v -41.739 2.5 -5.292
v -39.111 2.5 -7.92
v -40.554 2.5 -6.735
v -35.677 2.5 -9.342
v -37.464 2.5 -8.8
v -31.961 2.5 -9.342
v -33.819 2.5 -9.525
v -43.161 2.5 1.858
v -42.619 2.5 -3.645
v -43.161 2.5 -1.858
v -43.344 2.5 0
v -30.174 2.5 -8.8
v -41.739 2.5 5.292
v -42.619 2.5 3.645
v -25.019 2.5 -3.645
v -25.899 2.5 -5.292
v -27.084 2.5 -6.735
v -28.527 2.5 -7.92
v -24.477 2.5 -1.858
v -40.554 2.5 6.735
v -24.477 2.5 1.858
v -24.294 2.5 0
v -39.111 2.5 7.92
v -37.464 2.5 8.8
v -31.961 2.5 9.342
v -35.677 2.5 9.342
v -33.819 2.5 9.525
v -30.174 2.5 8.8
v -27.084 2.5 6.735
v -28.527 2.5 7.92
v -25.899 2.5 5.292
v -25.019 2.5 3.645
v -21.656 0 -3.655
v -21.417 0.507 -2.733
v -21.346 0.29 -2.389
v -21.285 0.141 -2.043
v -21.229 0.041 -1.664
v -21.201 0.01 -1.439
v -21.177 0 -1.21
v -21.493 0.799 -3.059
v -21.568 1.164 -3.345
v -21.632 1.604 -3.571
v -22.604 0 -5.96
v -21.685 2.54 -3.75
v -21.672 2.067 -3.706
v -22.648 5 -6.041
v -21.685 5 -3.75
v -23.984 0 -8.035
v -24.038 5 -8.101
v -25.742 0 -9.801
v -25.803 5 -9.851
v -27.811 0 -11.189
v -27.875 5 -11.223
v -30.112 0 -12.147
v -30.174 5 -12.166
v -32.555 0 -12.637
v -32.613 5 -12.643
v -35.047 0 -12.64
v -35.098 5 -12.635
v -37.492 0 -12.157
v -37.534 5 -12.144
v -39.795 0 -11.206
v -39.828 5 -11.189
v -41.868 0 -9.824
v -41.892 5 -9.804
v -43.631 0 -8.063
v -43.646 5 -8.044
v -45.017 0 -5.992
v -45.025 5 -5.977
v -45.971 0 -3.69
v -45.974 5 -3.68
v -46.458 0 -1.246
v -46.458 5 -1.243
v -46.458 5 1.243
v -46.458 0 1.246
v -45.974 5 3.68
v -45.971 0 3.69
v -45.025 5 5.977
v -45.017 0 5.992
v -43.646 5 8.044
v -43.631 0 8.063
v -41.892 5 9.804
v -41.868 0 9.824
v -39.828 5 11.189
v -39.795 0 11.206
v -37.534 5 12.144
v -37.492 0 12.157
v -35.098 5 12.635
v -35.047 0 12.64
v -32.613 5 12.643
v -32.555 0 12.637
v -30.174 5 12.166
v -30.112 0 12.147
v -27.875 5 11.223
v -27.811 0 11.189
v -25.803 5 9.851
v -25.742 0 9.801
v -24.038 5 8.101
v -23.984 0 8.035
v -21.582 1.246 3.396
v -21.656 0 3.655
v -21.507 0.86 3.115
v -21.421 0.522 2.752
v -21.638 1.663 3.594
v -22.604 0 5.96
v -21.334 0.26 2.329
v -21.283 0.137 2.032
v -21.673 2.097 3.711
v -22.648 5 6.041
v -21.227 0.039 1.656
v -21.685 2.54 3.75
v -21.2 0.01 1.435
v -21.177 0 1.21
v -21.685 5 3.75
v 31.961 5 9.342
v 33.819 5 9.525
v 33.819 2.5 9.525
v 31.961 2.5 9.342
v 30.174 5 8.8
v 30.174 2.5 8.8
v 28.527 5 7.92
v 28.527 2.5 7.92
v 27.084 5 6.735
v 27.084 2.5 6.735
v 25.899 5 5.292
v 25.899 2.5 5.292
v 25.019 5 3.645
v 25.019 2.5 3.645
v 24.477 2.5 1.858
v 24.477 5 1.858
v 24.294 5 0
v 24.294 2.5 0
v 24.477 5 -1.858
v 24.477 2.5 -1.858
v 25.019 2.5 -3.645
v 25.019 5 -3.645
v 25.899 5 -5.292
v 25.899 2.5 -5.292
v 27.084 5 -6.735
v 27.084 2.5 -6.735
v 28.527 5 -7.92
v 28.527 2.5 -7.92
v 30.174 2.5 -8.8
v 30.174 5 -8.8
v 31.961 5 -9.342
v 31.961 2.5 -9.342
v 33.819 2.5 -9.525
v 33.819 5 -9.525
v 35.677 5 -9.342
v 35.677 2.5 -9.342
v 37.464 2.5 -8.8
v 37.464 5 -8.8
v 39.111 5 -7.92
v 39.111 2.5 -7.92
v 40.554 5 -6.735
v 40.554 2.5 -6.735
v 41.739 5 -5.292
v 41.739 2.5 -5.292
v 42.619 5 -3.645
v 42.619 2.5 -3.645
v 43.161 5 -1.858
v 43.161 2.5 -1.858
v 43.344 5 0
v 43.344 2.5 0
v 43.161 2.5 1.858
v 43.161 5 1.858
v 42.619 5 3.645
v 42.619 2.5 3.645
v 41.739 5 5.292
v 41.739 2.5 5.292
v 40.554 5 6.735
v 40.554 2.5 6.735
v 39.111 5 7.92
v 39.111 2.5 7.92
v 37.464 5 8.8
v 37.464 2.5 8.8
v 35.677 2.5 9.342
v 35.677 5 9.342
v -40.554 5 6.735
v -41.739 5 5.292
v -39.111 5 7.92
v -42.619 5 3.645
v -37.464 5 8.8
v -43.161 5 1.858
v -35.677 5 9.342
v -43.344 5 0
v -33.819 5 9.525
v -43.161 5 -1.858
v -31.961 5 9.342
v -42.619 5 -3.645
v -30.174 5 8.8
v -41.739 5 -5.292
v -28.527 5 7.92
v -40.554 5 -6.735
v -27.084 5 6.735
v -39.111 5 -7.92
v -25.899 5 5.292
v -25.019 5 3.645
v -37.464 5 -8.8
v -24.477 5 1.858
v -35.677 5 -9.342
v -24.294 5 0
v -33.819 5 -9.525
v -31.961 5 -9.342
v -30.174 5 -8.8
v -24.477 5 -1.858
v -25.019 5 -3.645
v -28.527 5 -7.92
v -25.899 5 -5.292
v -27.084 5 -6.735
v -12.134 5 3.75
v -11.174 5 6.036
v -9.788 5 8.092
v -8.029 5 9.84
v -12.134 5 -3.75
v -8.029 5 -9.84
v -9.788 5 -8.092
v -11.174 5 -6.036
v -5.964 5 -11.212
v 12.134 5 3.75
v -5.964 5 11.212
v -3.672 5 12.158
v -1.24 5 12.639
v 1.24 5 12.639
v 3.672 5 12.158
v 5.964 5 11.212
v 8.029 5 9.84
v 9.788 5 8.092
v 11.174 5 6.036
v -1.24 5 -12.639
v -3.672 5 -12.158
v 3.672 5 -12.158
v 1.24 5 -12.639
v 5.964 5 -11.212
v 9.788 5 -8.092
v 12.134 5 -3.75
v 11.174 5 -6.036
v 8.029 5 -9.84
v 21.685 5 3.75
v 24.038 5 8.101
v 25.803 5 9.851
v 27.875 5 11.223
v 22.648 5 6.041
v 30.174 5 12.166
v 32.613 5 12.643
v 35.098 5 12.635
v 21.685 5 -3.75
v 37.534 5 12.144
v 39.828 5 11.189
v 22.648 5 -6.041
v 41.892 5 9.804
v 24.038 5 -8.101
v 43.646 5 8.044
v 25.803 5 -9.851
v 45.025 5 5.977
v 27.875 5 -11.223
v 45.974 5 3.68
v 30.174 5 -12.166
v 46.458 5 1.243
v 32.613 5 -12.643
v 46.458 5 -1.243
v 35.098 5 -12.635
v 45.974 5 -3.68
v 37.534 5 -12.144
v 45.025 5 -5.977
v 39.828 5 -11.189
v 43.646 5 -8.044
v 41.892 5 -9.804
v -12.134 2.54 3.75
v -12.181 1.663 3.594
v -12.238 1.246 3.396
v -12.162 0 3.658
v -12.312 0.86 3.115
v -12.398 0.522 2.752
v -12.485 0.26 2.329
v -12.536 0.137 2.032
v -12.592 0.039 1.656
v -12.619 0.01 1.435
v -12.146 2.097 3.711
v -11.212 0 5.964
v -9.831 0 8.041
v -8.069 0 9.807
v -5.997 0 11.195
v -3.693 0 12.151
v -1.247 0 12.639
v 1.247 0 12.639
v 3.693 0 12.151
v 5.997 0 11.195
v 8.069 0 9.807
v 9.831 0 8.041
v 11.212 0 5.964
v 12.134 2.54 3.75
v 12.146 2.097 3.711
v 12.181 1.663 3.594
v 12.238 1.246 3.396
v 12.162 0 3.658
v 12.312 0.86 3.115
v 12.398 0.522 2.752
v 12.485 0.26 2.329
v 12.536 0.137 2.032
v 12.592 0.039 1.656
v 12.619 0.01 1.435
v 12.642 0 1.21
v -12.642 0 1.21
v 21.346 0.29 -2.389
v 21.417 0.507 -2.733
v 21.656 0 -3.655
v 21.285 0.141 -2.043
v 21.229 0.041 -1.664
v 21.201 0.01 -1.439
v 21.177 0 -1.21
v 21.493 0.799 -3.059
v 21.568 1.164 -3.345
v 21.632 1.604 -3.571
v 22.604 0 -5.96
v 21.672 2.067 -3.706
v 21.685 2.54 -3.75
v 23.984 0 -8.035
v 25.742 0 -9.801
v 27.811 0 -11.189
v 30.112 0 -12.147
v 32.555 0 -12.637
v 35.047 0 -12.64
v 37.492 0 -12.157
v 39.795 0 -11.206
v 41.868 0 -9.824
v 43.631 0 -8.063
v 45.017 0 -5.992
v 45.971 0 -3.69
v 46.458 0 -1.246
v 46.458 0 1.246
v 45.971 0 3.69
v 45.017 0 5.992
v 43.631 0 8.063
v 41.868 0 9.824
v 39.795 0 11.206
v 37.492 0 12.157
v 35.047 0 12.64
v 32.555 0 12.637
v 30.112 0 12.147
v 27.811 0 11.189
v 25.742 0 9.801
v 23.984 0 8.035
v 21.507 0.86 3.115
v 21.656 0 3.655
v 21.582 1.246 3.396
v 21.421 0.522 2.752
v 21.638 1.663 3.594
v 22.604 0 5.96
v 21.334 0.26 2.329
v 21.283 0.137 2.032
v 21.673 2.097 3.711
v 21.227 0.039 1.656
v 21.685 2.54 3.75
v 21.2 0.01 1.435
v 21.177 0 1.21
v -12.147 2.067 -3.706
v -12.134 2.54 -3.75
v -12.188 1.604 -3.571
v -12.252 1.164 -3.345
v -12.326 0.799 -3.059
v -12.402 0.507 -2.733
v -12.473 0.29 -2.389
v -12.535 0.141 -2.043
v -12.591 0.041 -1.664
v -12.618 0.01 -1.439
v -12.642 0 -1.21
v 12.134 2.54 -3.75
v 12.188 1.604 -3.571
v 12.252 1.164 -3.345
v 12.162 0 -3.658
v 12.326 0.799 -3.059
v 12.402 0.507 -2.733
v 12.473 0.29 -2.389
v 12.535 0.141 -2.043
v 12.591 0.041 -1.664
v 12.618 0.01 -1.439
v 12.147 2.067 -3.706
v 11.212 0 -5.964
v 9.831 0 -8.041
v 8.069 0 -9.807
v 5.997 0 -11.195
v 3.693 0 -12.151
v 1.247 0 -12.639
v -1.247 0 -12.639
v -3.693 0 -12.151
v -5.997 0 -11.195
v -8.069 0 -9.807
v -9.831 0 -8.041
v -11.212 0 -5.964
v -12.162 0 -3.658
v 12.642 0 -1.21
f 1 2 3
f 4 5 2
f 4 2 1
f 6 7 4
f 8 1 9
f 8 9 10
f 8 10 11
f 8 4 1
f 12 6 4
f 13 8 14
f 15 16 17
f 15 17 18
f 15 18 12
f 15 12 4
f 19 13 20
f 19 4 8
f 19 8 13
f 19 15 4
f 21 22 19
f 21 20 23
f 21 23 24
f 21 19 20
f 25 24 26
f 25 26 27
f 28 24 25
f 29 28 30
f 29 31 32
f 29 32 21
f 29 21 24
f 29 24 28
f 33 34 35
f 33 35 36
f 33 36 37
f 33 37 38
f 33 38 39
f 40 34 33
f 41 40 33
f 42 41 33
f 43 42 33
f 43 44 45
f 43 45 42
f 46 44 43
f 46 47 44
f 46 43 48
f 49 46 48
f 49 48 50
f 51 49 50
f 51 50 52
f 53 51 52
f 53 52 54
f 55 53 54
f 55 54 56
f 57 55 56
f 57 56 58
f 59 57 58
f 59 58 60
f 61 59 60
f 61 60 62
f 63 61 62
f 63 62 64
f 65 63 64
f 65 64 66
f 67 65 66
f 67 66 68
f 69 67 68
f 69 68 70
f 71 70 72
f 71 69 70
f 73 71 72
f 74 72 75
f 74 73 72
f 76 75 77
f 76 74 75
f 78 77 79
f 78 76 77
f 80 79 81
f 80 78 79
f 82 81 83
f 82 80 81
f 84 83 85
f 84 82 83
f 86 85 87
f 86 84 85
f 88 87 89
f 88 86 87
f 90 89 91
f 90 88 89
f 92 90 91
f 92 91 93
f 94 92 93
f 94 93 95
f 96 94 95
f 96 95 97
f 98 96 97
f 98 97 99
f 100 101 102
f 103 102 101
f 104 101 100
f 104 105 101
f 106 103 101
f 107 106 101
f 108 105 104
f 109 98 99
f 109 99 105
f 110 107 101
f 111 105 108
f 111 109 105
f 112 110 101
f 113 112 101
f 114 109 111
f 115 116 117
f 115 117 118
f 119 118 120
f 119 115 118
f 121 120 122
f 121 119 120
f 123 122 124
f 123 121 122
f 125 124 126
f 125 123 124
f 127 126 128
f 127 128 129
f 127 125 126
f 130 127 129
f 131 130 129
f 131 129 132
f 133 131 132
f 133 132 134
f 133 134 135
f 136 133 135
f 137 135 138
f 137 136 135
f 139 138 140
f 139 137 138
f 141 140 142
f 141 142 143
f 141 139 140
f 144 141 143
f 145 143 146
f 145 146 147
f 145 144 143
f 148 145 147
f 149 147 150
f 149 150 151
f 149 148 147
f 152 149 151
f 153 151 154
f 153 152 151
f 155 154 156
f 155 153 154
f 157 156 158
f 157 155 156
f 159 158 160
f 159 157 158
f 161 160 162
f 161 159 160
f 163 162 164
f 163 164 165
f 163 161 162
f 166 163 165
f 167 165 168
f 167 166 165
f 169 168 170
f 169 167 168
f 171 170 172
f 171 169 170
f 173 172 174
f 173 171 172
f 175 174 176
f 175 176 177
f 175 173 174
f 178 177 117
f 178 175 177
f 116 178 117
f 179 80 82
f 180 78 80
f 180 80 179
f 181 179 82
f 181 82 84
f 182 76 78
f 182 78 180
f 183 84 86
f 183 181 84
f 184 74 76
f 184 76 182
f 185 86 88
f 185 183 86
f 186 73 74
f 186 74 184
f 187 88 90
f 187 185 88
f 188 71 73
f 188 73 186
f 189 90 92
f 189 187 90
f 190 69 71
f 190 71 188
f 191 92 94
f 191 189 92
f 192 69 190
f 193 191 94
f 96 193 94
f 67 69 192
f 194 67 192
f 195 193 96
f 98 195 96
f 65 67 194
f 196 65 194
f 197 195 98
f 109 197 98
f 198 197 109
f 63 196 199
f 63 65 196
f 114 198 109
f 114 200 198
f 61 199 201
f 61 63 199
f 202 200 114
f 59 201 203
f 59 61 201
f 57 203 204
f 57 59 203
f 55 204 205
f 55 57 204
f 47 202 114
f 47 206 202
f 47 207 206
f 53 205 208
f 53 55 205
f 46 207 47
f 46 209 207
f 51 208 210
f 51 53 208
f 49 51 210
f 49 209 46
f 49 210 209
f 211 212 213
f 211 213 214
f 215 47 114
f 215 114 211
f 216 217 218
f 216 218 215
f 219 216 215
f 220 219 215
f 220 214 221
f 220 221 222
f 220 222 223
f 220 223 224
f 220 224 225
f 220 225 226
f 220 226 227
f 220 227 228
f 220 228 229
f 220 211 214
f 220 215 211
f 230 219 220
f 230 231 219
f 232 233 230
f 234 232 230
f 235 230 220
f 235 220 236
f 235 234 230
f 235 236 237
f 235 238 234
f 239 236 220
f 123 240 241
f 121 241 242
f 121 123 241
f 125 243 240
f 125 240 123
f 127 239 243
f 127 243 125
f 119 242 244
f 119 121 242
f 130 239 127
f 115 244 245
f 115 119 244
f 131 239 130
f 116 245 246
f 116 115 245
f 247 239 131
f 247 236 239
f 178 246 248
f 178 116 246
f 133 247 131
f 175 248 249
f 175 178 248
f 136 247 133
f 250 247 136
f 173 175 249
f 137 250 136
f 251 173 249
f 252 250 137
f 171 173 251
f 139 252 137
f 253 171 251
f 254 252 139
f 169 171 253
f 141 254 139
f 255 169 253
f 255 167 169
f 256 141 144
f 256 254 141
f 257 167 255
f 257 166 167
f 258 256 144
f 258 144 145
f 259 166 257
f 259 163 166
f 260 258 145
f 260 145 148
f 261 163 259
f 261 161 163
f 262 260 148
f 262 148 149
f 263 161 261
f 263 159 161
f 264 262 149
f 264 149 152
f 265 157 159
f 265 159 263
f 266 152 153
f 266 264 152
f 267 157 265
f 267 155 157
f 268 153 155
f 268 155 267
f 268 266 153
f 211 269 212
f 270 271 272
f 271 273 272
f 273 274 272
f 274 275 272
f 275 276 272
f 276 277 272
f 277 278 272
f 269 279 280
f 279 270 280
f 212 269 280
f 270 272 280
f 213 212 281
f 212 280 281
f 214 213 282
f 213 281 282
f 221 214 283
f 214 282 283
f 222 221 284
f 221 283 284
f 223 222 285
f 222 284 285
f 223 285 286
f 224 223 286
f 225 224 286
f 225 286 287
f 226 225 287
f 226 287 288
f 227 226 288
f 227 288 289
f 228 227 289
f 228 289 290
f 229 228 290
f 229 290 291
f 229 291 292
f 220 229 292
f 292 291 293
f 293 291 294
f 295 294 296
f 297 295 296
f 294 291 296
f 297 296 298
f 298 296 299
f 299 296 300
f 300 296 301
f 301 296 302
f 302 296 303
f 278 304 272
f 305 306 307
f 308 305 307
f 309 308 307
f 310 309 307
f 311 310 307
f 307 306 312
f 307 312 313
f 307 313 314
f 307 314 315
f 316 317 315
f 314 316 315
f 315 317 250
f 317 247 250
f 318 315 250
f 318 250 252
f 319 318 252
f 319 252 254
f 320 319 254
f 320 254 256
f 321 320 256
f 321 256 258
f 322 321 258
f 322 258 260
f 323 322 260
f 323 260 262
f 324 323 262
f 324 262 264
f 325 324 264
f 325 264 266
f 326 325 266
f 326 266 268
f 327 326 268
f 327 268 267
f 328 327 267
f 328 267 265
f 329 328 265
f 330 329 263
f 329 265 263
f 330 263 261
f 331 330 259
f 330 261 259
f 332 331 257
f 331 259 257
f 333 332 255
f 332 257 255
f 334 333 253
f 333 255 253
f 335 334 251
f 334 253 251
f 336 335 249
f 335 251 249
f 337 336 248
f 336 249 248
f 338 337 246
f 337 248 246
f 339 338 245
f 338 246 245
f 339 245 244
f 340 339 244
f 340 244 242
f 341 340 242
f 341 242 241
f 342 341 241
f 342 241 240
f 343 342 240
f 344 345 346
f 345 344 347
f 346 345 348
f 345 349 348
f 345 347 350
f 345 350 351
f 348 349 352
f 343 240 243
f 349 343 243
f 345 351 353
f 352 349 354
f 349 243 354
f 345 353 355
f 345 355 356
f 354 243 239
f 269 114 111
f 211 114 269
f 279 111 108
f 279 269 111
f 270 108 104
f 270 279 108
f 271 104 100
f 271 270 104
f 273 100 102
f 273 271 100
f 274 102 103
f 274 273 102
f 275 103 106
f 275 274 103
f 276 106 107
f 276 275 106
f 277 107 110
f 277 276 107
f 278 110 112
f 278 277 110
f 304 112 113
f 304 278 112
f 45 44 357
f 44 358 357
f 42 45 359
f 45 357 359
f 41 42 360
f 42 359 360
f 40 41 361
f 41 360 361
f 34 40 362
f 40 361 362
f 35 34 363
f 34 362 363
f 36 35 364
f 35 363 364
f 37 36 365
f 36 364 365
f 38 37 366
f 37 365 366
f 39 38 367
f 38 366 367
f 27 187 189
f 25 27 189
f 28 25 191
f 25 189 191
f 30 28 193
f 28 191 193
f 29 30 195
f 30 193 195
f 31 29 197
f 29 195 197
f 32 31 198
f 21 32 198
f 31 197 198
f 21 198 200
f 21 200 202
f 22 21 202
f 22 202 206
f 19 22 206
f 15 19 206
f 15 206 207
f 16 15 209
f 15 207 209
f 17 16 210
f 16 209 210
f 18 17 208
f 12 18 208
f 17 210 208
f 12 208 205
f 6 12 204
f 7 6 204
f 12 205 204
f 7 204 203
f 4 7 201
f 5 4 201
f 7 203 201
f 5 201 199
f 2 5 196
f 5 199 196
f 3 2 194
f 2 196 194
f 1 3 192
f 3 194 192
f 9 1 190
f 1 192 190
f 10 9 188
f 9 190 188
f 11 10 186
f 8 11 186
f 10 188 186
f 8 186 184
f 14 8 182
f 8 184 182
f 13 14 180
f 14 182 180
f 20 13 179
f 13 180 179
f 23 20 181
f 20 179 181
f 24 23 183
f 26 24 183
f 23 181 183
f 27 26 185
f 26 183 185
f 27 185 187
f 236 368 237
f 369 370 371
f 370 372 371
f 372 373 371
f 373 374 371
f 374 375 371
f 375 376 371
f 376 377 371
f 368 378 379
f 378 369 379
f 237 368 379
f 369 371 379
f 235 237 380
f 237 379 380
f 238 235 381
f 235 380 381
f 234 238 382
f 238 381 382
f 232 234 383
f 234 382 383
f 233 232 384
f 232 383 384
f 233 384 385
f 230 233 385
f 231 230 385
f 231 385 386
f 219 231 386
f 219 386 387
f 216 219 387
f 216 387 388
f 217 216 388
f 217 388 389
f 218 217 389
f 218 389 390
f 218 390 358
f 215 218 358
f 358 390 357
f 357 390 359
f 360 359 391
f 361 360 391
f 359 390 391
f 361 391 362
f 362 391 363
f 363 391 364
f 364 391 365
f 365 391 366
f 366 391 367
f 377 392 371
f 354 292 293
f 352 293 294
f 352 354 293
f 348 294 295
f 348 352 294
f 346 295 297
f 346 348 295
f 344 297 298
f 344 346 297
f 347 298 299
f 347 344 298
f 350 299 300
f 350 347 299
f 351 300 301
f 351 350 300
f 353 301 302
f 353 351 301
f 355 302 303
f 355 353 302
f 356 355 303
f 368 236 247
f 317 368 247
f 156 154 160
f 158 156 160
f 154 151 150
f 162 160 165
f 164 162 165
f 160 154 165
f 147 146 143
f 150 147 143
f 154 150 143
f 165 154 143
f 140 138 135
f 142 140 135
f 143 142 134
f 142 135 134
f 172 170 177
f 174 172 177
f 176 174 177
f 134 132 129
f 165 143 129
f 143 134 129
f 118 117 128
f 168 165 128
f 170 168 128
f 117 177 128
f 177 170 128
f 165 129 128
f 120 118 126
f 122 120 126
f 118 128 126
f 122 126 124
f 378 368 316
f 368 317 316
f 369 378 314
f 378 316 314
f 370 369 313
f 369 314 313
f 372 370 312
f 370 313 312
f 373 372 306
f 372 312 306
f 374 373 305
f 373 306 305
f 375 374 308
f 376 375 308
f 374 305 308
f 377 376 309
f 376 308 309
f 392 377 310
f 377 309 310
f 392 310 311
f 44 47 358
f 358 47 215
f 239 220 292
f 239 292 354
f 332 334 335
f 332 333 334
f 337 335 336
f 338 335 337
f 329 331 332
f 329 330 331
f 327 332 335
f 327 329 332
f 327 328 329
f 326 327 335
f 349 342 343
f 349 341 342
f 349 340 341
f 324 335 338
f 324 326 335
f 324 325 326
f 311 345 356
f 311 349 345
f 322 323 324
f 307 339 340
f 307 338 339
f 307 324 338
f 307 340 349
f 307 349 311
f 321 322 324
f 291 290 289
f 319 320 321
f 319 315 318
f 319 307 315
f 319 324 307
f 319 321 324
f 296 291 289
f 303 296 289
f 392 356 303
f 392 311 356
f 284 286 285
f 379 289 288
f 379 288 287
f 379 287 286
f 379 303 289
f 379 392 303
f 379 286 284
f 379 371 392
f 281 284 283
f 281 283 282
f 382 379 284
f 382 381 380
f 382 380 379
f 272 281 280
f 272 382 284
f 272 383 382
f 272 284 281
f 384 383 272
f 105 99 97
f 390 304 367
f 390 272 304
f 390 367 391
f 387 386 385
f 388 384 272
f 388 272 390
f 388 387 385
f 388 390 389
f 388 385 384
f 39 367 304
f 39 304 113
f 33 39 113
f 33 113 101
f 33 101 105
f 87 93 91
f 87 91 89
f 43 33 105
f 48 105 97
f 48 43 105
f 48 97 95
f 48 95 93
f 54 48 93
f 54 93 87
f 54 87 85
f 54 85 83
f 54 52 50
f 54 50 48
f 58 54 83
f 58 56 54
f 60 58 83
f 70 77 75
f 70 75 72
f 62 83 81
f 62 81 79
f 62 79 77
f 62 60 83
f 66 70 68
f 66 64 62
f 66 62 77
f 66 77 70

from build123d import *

# Parameters (mm, degrees)
SKETCH1_R           = 12.7
BOSS_EXTRUDE1_DEPTH = 5
SKETCH2_W           = 76.2
SKETCH2_H           = 7.5
BOSS_EXTRUDE2_DEPTH = 5
SKETCH3_R           = 12.7
BOSS_EXTRUDE3_DEPTH = 5
SKETCH4_R           = 9.525
CUT_EXTRUDE1_DEPTH  = 2.5
FILLET1_R           = 2.54


with BuildPart() as part:
    # Sketch1 → Boss-Extrude1 (new body)
    with BuildSketch(Plane(origin=(0, 0, 0), x_dir=(1, 0, 0), z_dir=(0, 1, 0))):
        with Locations(Location((0, 0, 0), (0, 0, 270))):
            Circle(SKETCH1_R)
    extrude(amount=BOSS_EXTRUDE1_DEPTH)

    # Sketch2 → Boss-Extrude2 (add)
    with BuildSketch(Plane(origin=(0, 5, 0), x_dir=(1, 0, 0), z_dir=(0, 1, 0))):
        Rectangle(SKETCH2_W, SKETCH2_H)
    extrude(amount=-BOSS_EXTRUDE2_DEPTH)

    # Sketch3 → Boss-Extrude3 (add)
    with BuildSketch(Plane(origin=(0, 5, 0), x_dir=(1, 0, 0), z_dir=(0, 1, 0))):
        with Locations((-33.819087464, 0)):
            Circle(SKETCH3_R)
    boss_extrude3 = extrude(amount=-BOSS_EXTRUDE3_DEPTH)

    # Sketch4 → Cut-Extrude1 (cut)
    with BuildSketch(Plane(origin=(0, 5, 0), x_dir=(1, 0, 0), z_dir=(0, 1, 0))):
        with Locations(Location((-33.819087464, 0, 0), (0, 0, 270))):
            Circle(SKETCH4_R)
    cut_extrude1 = extrude(amount=-CUT_EXTRUDE1_DEPTH, mode=Mode.SUBTRACT)

    # Mirror1: Boss-Extrude3, Cut-Extrude1 across plane
    add(boss_extrude3.mirror(Plane(origin=(0, 0, 0), x_dir=(0, 0, 1), z_dir=(1, 0, 0))))
    add(cut_extrude1.mirror(Plane(origin=(0, 0, 0), x_dir=(0, 0, 1), z_dir=(1, 0, 0))), mode=Mode.SUBTRACT)

    # Fillet1
    fillet1_edges = [part.edges().sort_by_distance(p)[0] for p in [
        (16.909543732, 0, -3.75),
        (-16.909543732, 0, 3.75),
        (-16.909543732, 0, -3.75),
        (16.909543732, 0, 3.75),
    ]]
    fillet(fillet1_edges, radius=FILLET1_R)


solid = part.part
